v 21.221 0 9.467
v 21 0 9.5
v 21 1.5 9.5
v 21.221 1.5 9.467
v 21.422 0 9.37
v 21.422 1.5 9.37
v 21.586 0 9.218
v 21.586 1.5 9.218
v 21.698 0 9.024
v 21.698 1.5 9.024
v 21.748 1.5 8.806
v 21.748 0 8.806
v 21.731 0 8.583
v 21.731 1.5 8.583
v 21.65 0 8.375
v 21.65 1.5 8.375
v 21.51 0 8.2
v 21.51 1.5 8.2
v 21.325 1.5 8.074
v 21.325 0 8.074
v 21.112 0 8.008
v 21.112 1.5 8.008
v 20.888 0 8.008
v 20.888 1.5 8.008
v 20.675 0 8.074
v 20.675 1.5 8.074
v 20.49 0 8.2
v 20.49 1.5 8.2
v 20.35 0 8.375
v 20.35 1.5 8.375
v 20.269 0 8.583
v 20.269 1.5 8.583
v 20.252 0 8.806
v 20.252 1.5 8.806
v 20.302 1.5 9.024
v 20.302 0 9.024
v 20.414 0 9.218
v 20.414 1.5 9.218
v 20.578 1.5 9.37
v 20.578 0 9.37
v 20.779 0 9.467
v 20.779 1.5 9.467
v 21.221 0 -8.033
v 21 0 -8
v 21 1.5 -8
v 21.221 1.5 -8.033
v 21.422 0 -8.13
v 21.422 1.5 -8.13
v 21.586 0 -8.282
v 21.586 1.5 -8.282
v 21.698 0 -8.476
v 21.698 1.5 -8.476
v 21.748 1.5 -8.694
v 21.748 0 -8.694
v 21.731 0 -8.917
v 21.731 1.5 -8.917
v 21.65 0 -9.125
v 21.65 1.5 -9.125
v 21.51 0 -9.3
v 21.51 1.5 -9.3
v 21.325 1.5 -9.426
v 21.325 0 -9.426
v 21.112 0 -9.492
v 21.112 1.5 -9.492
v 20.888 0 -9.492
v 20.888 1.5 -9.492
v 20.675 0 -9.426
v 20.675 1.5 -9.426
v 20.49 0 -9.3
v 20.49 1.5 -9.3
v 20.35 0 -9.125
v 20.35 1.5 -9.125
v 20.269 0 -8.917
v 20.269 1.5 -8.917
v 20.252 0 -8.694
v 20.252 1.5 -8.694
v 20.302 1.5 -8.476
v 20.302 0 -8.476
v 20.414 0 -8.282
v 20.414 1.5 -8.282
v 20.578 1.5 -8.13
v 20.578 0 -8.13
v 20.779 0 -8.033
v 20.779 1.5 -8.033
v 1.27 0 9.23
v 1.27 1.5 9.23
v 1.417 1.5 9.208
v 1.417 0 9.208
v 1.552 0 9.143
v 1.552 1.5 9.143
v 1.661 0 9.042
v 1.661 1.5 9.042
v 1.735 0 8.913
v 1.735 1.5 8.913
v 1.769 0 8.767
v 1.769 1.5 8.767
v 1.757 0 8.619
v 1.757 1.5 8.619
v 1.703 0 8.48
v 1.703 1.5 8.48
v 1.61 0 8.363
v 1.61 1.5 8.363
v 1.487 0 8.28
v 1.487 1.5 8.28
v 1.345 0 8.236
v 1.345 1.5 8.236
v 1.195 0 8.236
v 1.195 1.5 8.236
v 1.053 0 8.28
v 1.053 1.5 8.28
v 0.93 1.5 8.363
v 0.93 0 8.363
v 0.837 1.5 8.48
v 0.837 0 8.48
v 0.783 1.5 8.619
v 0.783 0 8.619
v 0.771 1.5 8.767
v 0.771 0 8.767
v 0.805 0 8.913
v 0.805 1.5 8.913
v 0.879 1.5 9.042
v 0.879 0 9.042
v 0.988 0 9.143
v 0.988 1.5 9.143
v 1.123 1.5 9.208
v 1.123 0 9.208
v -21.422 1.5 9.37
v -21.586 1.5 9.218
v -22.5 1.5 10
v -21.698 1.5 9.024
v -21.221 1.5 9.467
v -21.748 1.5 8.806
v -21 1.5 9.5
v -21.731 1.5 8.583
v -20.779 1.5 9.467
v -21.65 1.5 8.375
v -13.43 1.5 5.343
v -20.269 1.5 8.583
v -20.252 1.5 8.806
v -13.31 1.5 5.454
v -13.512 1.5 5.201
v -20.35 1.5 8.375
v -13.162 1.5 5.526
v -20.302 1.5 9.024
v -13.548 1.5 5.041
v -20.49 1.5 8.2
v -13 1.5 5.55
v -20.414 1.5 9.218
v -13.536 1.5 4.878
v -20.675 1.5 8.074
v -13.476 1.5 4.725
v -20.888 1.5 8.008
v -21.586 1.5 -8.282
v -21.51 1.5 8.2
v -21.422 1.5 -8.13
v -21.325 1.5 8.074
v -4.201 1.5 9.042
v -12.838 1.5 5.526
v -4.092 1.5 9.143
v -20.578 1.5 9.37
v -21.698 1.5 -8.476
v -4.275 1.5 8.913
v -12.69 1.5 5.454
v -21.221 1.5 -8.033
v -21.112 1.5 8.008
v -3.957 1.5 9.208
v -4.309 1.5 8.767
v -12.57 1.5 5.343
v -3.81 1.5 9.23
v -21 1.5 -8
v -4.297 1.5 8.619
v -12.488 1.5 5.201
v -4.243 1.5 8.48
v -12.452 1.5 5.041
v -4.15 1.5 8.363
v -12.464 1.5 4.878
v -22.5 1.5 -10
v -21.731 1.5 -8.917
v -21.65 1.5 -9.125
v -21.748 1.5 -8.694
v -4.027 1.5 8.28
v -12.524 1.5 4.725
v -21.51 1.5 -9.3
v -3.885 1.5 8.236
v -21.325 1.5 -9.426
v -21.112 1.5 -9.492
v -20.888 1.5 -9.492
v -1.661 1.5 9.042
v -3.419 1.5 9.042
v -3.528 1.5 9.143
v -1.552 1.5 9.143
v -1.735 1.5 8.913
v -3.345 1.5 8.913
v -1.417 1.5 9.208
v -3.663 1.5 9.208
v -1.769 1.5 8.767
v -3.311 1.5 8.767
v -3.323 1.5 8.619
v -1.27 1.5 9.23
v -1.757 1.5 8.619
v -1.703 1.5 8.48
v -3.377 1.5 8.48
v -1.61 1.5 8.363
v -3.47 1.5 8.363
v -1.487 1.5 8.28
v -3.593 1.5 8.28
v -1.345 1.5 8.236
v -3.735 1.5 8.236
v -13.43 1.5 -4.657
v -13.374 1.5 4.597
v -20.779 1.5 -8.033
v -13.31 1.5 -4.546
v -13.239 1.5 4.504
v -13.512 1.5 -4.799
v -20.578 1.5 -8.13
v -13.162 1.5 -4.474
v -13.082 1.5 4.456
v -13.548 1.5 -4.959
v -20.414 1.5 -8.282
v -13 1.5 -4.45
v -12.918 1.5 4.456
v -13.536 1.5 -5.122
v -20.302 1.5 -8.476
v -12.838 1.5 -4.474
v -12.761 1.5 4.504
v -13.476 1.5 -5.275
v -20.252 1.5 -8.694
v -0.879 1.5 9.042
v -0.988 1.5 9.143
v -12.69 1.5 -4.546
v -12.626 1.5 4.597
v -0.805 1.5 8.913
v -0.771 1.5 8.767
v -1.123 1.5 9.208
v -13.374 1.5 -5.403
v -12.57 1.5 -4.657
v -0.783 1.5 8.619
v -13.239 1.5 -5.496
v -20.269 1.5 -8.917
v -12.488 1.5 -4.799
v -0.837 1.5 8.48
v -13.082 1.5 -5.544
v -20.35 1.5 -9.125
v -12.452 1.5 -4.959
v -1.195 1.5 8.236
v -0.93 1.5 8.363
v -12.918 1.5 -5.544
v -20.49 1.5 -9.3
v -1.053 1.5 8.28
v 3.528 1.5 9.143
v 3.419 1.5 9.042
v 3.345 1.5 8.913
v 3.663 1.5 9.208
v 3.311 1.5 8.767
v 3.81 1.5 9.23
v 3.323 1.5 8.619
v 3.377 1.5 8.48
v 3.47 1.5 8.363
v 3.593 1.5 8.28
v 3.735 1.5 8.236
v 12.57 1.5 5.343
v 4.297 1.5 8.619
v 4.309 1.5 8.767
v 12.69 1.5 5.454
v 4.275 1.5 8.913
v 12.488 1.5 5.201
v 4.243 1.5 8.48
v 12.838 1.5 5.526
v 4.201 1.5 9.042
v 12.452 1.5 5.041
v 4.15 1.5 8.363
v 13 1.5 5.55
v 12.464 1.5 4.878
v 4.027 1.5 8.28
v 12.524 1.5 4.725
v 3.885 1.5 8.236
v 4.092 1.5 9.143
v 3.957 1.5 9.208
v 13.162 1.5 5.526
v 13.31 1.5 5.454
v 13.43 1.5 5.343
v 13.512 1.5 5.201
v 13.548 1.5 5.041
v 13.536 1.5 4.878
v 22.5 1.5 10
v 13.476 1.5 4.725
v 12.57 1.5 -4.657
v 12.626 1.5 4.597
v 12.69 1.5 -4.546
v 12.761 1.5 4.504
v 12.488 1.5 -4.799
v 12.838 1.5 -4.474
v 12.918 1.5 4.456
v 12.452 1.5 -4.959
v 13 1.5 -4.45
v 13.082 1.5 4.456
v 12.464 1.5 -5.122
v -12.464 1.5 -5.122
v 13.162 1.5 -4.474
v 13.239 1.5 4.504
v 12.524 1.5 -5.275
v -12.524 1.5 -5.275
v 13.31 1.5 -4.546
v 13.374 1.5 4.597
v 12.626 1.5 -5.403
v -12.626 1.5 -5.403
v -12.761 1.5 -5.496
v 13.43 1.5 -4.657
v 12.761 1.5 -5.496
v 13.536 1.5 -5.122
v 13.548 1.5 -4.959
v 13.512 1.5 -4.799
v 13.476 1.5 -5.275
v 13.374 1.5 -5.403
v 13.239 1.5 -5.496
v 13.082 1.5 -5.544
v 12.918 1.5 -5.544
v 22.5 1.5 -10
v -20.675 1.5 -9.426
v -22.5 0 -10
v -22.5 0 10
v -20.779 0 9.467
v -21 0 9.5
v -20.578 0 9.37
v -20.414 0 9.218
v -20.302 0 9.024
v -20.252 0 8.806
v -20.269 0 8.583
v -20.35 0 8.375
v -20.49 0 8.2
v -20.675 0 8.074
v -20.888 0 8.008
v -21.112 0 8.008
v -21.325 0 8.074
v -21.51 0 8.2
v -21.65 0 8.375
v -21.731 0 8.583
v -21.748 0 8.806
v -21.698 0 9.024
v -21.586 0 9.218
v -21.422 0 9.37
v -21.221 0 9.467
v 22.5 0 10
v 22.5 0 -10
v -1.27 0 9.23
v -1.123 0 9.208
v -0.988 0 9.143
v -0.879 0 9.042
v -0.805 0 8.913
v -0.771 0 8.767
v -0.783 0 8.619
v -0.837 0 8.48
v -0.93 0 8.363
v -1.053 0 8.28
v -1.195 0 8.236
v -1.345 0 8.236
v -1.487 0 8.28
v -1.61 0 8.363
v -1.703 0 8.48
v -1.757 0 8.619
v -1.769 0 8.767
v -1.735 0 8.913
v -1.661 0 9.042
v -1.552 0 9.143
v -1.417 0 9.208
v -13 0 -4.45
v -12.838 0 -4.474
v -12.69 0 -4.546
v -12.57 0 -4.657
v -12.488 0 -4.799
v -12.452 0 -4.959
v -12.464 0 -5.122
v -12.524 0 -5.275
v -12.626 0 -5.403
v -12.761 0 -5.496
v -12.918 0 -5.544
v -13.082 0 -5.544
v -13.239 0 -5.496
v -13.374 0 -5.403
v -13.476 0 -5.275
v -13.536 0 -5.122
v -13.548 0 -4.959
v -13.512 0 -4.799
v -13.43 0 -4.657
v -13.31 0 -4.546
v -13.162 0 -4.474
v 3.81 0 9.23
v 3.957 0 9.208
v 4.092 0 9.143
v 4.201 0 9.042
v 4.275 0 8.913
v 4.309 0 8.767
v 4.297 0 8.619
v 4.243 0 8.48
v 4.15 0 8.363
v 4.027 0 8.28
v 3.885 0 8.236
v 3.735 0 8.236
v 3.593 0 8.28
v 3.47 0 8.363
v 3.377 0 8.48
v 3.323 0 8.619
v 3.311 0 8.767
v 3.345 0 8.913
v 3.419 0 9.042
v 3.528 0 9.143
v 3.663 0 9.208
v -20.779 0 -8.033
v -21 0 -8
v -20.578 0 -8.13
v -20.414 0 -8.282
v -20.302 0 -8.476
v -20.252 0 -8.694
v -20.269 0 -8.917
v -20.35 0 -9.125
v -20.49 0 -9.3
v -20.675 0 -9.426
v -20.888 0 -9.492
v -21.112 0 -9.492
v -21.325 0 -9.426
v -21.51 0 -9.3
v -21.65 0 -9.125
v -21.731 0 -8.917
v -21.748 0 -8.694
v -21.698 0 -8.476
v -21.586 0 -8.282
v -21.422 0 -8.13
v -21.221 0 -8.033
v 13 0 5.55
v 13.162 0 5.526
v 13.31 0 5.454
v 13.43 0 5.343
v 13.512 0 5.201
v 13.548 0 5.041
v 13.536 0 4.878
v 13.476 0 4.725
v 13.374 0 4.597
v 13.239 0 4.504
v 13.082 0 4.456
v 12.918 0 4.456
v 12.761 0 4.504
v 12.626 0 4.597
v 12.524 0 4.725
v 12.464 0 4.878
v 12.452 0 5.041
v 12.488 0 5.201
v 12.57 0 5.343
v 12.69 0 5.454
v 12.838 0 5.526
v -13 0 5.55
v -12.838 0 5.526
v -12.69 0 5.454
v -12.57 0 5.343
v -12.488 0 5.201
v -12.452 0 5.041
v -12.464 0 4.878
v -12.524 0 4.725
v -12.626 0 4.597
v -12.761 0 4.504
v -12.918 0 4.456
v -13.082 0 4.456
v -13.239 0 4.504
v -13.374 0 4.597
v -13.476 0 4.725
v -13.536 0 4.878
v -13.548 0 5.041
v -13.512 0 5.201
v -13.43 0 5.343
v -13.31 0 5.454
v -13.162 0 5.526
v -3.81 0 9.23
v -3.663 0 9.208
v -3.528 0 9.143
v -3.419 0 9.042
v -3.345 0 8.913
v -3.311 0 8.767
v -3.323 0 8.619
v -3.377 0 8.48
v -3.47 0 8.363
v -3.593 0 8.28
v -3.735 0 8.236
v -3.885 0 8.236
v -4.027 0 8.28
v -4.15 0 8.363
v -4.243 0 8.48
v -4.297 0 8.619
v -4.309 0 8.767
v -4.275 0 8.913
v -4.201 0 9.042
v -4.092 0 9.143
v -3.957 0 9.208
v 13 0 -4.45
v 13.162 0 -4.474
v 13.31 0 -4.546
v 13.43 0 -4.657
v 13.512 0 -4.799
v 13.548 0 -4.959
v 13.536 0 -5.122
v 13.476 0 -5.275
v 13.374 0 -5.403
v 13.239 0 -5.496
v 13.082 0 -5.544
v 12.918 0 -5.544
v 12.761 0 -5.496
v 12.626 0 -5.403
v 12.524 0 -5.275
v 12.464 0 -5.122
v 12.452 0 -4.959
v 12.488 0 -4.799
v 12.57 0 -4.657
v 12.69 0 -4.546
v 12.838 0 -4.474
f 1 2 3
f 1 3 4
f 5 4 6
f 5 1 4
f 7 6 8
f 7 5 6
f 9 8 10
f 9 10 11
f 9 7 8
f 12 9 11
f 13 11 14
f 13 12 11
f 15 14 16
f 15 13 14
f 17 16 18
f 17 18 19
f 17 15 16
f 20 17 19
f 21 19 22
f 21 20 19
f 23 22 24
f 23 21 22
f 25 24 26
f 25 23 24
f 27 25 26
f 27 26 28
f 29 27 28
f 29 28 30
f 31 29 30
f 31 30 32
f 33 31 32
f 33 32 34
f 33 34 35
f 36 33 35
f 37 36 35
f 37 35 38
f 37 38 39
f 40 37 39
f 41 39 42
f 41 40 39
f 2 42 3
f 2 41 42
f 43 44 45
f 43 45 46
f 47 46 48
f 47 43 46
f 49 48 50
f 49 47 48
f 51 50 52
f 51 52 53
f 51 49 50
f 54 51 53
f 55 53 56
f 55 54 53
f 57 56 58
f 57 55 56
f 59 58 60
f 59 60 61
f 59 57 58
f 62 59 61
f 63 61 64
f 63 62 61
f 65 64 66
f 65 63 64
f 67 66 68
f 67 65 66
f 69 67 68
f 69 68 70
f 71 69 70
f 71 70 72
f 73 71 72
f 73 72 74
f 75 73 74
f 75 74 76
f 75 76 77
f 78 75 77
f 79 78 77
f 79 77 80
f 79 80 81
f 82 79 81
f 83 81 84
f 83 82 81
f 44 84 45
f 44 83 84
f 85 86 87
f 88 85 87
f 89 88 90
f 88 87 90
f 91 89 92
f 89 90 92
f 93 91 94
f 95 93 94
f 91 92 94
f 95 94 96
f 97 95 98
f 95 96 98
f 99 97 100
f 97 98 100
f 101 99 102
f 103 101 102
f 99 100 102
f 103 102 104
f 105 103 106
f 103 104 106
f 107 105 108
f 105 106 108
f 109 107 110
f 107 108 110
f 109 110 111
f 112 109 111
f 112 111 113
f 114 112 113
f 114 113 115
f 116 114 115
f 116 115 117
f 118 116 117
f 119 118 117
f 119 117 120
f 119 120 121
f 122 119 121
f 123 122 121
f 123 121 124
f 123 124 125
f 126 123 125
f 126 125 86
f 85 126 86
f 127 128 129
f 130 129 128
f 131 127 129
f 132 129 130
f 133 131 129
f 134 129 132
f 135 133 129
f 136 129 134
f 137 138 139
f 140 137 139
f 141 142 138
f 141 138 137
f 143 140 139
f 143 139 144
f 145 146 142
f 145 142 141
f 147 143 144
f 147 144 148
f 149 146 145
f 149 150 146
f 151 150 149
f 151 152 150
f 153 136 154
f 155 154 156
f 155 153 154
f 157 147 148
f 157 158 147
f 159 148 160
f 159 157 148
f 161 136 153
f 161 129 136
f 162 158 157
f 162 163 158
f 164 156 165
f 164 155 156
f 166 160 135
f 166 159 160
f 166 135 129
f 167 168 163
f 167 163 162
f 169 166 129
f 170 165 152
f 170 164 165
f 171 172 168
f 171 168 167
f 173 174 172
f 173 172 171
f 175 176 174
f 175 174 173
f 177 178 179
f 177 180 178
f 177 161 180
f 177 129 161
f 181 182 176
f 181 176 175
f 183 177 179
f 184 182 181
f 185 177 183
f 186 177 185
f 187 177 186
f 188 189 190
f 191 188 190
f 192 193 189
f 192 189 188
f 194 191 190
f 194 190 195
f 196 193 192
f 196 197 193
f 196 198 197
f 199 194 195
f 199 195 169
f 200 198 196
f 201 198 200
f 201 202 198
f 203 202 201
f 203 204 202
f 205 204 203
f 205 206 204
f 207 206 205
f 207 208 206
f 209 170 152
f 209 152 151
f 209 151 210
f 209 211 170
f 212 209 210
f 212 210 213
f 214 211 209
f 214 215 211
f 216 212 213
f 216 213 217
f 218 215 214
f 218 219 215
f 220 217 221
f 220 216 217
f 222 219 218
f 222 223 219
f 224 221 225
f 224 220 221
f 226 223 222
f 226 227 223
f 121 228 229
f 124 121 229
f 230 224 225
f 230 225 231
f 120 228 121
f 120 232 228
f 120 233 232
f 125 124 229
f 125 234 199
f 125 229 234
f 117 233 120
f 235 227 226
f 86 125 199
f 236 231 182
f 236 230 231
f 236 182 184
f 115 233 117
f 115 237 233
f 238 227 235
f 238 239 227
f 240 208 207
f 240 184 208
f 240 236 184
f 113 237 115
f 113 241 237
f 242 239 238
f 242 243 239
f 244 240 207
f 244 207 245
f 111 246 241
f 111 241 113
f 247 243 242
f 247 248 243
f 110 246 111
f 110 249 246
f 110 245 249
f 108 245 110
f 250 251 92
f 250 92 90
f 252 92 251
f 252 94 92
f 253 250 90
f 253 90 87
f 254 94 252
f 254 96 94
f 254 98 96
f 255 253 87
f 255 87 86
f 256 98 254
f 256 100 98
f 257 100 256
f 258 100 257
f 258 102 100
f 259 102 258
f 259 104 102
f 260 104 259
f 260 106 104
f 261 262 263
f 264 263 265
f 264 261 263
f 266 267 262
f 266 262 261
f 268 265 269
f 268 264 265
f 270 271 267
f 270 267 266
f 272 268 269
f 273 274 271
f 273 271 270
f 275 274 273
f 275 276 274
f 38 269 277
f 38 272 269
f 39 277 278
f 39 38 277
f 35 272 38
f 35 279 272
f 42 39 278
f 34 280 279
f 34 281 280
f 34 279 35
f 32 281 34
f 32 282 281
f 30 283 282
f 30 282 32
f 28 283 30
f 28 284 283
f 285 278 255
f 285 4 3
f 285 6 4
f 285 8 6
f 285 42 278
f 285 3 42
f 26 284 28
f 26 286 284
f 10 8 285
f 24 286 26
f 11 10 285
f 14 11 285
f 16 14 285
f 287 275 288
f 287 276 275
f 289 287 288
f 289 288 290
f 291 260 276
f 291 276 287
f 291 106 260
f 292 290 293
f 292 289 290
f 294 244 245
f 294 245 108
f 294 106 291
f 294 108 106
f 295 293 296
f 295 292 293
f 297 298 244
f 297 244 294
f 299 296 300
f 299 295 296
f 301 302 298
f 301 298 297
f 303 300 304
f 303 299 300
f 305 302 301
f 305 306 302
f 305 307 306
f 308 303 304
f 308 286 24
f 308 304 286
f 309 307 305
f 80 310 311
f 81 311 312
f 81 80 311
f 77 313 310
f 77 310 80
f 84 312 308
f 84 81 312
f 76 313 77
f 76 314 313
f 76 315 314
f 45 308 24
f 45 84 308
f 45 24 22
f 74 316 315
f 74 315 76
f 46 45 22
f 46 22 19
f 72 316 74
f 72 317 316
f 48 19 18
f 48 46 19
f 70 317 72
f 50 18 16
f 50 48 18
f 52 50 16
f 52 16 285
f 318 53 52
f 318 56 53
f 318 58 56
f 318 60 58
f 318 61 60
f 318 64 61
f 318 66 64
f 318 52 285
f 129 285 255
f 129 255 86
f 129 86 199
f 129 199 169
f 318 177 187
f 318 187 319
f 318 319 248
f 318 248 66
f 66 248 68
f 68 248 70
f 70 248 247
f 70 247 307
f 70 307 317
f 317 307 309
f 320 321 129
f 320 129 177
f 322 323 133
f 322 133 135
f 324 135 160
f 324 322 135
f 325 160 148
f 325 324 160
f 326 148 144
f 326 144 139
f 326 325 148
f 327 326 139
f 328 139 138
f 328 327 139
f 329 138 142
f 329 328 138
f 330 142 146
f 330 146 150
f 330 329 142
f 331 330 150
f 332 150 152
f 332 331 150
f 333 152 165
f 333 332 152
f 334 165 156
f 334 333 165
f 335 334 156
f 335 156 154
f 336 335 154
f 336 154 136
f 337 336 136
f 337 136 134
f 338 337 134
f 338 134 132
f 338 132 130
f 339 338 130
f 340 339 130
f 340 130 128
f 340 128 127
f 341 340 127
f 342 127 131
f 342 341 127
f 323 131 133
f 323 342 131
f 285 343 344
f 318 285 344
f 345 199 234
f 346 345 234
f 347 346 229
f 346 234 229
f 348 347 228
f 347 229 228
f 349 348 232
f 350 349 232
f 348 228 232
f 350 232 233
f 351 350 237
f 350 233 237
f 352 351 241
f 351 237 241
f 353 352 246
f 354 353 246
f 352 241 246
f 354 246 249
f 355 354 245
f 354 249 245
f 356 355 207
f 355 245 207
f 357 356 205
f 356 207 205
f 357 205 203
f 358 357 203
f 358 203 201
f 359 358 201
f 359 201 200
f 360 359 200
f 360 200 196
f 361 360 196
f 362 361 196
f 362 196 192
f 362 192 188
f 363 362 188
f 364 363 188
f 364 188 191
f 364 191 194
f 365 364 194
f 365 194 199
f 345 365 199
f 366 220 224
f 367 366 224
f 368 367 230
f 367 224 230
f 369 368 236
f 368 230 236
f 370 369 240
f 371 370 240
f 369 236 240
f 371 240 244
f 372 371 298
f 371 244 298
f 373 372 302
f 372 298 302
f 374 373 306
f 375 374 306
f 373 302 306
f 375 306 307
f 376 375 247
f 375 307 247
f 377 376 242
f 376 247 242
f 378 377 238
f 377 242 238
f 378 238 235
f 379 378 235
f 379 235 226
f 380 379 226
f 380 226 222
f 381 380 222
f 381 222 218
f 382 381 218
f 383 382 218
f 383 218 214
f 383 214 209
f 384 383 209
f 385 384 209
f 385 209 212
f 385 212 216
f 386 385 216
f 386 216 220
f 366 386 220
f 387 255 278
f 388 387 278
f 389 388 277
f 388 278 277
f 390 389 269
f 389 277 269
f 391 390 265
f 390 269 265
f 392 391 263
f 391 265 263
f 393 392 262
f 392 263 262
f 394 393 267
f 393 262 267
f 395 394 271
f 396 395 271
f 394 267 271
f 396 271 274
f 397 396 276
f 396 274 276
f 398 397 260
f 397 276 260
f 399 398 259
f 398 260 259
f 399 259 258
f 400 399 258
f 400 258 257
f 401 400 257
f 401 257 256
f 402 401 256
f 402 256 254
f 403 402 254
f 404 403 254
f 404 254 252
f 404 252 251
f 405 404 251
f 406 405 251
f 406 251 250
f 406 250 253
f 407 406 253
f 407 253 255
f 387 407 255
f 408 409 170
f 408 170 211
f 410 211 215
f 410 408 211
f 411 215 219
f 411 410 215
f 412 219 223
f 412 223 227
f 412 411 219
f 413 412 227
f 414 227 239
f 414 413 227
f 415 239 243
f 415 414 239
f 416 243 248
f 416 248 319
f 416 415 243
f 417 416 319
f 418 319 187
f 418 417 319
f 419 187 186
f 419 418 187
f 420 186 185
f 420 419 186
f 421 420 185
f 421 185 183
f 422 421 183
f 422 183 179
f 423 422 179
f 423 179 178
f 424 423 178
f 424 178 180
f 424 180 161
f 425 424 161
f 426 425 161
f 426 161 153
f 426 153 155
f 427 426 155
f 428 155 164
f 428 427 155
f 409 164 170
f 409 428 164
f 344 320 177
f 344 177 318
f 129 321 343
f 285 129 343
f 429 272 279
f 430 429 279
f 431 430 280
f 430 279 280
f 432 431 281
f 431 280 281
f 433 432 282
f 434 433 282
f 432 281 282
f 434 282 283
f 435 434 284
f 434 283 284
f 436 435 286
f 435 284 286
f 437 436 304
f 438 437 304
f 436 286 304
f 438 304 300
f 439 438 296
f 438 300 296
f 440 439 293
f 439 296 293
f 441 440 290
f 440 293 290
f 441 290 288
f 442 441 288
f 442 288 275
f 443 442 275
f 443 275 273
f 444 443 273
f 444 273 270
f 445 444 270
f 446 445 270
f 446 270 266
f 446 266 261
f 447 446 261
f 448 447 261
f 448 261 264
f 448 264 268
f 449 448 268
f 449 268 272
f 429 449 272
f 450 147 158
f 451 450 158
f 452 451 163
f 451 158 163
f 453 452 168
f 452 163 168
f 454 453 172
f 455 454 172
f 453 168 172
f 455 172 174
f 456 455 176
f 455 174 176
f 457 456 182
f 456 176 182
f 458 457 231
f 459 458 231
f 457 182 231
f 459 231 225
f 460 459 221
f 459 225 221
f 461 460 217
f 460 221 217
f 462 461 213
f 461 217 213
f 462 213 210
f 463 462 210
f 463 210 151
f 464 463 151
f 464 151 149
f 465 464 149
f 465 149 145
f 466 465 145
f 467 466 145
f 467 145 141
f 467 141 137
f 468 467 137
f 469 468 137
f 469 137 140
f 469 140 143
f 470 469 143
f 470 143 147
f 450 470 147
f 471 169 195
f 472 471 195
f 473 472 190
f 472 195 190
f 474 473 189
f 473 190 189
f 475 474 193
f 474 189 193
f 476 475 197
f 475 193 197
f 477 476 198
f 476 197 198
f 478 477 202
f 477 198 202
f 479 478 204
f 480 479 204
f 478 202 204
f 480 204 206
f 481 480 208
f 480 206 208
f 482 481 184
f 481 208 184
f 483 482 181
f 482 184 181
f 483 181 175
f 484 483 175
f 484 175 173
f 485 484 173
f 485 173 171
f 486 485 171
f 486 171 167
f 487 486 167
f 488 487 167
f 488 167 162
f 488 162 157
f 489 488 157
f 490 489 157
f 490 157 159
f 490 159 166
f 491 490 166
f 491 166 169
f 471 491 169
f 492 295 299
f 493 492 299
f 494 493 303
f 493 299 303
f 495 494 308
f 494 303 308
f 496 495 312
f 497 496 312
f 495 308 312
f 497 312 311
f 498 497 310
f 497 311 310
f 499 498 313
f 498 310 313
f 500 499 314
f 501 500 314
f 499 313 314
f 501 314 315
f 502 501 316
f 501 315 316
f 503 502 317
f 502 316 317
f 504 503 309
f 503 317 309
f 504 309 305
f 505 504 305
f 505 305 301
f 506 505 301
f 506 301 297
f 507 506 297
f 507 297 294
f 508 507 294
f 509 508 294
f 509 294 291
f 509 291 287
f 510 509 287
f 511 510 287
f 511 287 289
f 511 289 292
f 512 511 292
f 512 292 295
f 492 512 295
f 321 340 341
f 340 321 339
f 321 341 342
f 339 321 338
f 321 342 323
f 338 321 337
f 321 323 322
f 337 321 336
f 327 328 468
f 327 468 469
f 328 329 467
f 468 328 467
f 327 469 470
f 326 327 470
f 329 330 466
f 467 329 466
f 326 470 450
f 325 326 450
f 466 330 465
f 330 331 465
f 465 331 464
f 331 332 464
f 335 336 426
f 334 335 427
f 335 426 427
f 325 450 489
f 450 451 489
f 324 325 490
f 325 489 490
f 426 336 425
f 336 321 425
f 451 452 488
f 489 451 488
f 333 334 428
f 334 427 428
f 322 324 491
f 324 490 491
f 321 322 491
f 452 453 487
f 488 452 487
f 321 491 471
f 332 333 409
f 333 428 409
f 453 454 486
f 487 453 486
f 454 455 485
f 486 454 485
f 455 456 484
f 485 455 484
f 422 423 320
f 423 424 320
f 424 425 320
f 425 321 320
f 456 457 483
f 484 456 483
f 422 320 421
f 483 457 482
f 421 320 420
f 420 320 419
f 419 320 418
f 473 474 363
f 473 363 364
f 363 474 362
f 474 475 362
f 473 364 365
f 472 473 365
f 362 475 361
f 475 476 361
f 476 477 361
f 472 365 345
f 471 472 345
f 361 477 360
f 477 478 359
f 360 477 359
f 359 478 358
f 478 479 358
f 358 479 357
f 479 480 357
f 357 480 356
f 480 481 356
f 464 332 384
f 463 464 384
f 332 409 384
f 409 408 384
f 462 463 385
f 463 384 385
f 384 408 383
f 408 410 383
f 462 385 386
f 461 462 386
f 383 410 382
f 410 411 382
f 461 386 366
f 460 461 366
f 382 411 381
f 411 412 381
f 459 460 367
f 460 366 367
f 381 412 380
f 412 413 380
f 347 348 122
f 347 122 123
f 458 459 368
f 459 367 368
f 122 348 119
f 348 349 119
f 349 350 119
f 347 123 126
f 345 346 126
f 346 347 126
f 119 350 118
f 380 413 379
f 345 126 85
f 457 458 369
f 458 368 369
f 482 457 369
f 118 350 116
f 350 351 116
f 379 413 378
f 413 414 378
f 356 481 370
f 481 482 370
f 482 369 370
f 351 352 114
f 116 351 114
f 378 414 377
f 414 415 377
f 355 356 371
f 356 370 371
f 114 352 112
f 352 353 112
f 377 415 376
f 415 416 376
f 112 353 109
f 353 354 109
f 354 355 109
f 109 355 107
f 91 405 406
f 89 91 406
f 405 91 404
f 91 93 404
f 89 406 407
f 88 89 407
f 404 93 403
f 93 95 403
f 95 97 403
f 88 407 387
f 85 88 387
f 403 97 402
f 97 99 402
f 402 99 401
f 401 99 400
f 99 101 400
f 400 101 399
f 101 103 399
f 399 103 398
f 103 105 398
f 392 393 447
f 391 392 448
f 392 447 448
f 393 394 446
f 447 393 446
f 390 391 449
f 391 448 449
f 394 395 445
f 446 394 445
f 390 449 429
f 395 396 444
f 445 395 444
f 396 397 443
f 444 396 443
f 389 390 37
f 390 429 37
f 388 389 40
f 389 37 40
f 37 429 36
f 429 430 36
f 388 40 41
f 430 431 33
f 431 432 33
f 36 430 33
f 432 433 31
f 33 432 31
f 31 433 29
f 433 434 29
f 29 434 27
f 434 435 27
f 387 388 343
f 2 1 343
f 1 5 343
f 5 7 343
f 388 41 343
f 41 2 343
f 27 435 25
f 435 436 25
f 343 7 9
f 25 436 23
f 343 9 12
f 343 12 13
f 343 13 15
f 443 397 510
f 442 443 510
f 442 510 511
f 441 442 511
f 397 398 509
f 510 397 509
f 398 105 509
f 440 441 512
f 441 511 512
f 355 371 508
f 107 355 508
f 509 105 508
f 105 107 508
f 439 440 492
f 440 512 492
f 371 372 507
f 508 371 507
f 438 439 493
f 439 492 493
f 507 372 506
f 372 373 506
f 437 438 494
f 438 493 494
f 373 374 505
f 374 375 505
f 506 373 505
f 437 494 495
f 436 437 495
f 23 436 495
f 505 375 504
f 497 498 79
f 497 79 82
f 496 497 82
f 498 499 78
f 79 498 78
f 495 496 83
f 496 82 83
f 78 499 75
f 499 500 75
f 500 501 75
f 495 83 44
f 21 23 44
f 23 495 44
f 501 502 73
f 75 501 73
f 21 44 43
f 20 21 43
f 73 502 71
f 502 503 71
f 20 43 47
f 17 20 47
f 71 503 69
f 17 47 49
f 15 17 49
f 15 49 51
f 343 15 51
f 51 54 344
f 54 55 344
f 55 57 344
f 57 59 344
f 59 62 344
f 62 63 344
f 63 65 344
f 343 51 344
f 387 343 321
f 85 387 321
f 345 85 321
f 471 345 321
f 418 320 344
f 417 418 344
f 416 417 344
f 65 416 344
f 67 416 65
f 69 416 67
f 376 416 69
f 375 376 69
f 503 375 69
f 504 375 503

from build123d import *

# Parameters (mm, degrees)
SKETCH1_W   = 45
SKETCH1_H   = 20
SKETCH1_R   = 0.75
PCB_DEPTH   = 1.5
SKETCH2_R   = 0.5
SKETCH2_R_2 = 0.55
HOLES_DEPTH = 2


with BuildPart() as part:
    # Sketch1 → PCB (new body)
    with BuildSketch(Plane(origin=(0, 0, 0), x_dir=(1, 0, 0), z_dir=(0, 1, 0))):
        Rectangle(SKETCH1_W, SKETCH1_H)
        with Locations(Location((-21, 8.75, 0), (0, 0, 270))):
            Circle(SKETCH1_R, mode=Mode.SUBTRACT)
        with Locations(Location((-21, -8.75, 0), (0, 0, 270))):
            Circle(SKETCH1_R, mode=Mode.SUBTRACT)
        with Locations(Location((21, -8.75, 0), (0, 0, 270))):
            Circle(SKETCH1_R, mode=Mode.SUBTRACT)
        with Locations(Location((21, 8.75, 0), (0, 0, 270))):
            Circle(SKETCH1_R, mode=Mode.SUBTRACT)
    extrude(amount=PCB_DEPTH)

    # Sketch2 → Holes (cut)
    with BuildSketch(Plane(origin=(0, 1.5, 0), x_dir=(1, 0, 0), z_dir=(0, 1, 0))):
        with Locations(Location((-3.81, -8.73, 0), (0, 0, 270))):
            Circle(SKETCH2_R)
        with Locations(Location((-1.27, -8.73, 0), (0, 0, 270))):
            Circle(SKETCH2_R)
        with Locations(Location((1.27, -8.73, 0), (0, 0, 270))):
            Circle(SKETCH2_R)
        with Locations(Location((3.81, -8.73, 0), (0, 0, 270))):
            Circle(SKETCH2_R)
        with Locations(Location((13, 5, 0), (0, 0, 270))):
            Circle(SKETCH2_R_2)
        with Locations(Location((13, -5, 0), (0, 0, 270))):
            Circle(SKETCH2_R_2)
        with Locations(Location((-13, -5, 0), (0, 0, 270))):
            Circle(SKETCH2_R_2)
        with Locations(Location((-13, 5, 0), (0, 0, 270))):
            Circle(SKETCH2_R_2)
    extrude(amount=-HOLES_DEPTH, mode=Mode.SUBTRACT)


solid = part.part
